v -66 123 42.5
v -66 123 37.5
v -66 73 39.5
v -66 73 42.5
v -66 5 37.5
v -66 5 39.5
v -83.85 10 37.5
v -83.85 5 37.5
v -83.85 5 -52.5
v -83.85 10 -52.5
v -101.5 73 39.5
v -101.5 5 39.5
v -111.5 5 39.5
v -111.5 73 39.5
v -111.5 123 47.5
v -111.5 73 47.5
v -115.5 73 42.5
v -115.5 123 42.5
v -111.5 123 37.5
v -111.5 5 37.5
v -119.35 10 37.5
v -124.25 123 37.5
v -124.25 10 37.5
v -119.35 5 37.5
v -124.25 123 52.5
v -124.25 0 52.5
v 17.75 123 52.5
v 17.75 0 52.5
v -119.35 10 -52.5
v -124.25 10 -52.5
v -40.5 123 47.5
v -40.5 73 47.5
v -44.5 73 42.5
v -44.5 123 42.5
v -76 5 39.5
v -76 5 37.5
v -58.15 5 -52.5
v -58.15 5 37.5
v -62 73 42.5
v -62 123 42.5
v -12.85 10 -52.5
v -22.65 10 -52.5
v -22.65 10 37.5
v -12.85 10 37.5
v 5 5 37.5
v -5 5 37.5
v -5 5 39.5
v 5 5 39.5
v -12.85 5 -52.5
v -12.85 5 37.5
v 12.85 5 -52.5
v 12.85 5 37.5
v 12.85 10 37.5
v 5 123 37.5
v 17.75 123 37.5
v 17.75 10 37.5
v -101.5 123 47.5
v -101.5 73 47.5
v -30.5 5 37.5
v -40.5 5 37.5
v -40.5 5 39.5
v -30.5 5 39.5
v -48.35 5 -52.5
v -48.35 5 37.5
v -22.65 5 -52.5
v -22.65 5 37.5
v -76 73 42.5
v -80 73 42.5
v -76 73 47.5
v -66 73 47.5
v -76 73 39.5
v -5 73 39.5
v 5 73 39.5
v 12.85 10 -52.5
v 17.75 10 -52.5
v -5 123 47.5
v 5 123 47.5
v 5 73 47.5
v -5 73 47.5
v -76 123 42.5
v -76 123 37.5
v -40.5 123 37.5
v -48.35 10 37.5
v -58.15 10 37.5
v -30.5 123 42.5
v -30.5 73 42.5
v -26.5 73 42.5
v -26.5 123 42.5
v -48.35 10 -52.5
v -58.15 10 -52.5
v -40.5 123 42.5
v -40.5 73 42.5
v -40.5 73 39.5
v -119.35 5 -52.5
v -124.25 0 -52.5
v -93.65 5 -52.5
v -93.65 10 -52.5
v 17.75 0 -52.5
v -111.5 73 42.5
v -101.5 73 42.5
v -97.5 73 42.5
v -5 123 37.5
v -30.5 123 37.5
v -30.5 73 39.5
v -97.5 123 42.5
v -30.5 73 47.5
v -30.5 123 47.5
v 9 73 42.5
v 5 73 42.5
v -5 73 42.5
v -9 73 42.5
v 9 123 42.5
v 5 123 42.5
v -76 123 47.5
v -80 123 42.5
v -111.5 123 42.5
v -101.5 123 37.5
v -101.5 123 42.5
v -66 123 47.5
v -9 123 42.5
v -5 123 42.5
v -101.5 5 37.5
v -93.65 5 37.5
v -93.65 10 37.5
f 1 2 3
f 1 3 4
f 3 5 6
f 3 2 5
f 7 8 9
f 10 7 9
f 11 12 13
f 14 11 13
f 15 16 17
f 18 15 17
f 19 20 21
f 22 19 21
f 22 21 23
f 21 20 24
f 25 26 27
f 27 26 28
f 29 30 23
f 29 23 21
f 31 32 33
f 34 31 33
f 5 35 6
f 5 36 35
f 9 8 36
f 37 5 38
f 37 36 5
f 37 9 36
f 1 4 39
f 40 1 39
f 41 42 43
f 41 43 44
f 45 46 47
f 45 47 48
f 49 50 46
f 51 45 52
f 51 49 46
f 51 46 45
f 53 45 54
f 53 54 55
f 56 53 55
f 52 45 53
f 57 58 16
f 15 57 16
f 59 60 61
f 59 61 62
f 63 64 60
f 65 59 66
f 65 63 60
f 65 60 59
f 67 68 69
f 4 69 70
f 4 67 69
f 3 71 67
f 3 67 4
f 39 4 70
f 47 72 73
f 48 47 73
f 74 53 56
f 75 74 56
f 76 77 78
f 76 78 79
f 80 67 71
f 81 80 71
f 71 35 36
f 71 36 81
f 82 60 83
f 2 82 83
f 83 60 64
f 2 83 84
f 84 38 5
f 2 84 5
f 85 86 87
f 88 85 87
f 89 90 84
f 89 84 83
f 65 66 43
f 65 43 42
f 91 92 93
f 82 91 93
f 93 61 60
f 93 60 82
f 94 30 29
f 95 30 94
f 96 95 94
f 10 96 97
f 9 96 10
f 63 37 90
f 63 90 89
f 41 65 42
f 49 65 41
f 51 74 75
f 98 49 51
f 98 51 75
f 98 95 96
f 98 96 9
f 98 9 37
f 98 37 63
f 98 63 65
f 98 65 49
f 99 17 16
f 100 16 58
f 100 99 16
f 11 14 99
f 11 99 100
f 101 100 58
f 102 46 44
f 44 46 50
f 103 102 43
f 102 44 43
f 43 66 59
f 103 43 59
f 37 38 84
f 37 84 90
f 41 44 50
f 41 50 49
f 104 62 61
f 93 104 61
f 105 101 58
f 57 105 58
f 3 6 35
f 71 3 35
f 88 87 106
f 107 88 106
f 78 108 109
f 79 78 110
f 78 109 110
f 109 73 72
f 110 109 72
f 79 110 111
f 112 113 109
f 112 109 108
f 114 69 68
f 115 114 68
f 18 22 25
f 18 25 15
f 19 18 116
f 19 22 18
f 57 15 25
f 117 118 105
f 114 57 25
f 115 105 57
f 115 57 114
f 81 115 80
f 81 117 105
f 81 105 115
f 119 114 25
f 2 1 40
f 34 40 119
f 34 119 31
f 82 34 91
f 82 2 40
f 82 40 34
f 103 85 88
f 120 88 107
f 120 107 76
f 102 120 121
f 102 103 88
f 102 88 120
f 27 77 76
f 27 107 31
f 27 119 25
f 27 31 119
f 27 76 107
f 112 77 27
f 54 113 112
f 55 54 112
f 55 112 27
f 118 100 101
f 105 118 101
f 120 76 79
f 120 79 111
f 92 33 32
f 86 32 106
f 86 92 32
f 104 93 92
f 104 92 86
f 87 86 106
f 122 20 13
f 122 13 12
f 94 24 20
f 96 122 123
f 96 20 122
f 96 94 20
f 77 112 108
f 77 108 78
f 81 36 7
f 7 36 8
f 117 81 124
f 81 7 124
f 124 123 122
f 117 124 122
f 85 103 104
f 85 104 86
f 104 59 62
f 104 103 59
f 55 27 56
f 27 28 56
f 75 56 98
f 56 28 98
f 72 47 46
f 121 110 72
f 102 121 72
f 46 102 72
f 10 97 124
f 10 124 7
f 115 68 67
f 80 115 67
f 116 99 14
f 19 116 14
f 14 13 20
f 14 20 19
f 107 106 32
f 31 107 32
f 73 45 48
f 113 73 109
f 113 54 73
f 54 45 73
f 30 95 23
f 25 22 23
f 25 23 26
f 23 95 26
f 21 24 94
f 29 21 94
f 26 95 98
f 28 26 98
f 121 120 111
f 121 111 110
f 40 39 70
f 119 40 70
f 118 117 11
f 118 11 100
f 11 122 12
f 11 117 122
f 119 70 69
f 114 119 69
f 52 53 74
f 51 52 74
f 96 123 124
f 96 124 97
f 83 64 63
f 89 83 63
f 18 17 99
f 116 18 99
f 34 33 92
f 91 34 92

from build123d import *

# Parameters (mm, degrees)
SKETCH1_W           = 35.5
SKETCH1_H           = 105
BOSS_EXTRUDE1_DEPTH = 10
SKETCH2_W           = 35.5
SKETCH2_H           = 15
BOSS_EXTRUDE2_DEPTH = 113
SKETCH5_W           = 25.7
SKETCH5_H           = 90
CUT_EXTRUDE2_DEPTH  = 5
CUT_EXTRUDE3_DEPTH  = 50
SKETCH7_W           = 10
SKETCH7_H           = 2
CUT_EXTRUDE4_DEPTH  = 68
LPATTERN1_COUNT     = 4
LPATTERN1_PITCH     = 35.5


with BuildPart() as part:
    # Sketch1 → Boss-Extrude1 (new body)
    with BuildSketch(Plane(origin=(0, 0, 0), x_dir=(1, 0, 0), z_dir=(0, 1, 0))):
        Rectangle(SKETCH1_W, SKETCH1_H)
    boss_extrude1 = extrude(amount=BOSS_EXTRUDE1_DEPTH)

    # Sketch2 → Boss-Extrude2 (add)
    with BuildSketch(Plane(origin=(0, 10, 0), x_dir=(1, 0, 0), z_dir=(0, 1, 0))):
        with Locations((0, -45)):
            Rectangle(SKETCH2_W, SKETCH2_H)
    boss_extrude2 = extrude(amount=BOSS_EXTRUDE2_DEPTH)

    # Sketch5 → Cut-Extrude2 (cut)
    with BuildSketch(Plane(origin=(0, 10, 0), x_dir=(1, 0, 0), z_dir=(0, 1, 0))):
        with Locations((0, 7.5)):
            Rectangle(SKETCH5_W, SKETCH5_H)
    cut_extrude2 = extrude(amount=-CUT_EXTRUDE2_DEPTH, mode=Mode.SUBTRACT)

    # Sketch6 → Cut-Extrude3 (cut)
    with BuildSketch(Plane(origin=(0, 123, 0), x_dir=(1, 0, 0), z_dir=(0, 1, 0))):
        Polygon((-5, -37.5), (5, -37.5), (5, -42.5), (9, -42.5), (5, -47.5), (-5, -47.5), (-9, -42.5), (-5, -42.5), align=None)
    cut_extrude3 = extrude(amount=-CUT_EXTRUDE3_DEPTH, mode=Mode.SUBTRACT)

    # Sketch7 → Cut-Extrude4 (cut)
    with BuildSketch(Plane(origin=(0, 73, 0), x_dir=(1, 0, 0), z_dir=(0, 1, 0))):
        with Locations((0, -38.5)):
            Rectangle(SKETCH7_W, SKETCH7_H)
    cut_extrude4 = extrude(amount=-CUT_EXTRUDE4_DEPTH, mode=Mode.SUBTRACT)

    # LPattern1: Boss-Extrude1, Boss-Extrude2, Cut-Extrude2, Cut-Extrude3, Cut-Extrude4 ×4
    with Locations(*[(-i * LPATTERN1_PITCH, 0, 0) for i in range(1, LPATTERN1_COUNT)]):
        add(boss_extrude1)
        add(boss_extrude2)
        add(cut_extrude2, mode=Mode.SUBTRACT)
        add(cut_extrude3, mode=Mode.SUBTRACT)
        add(cut_extrude4, mode=Mode.SUBTRACT)


solid = part.part
